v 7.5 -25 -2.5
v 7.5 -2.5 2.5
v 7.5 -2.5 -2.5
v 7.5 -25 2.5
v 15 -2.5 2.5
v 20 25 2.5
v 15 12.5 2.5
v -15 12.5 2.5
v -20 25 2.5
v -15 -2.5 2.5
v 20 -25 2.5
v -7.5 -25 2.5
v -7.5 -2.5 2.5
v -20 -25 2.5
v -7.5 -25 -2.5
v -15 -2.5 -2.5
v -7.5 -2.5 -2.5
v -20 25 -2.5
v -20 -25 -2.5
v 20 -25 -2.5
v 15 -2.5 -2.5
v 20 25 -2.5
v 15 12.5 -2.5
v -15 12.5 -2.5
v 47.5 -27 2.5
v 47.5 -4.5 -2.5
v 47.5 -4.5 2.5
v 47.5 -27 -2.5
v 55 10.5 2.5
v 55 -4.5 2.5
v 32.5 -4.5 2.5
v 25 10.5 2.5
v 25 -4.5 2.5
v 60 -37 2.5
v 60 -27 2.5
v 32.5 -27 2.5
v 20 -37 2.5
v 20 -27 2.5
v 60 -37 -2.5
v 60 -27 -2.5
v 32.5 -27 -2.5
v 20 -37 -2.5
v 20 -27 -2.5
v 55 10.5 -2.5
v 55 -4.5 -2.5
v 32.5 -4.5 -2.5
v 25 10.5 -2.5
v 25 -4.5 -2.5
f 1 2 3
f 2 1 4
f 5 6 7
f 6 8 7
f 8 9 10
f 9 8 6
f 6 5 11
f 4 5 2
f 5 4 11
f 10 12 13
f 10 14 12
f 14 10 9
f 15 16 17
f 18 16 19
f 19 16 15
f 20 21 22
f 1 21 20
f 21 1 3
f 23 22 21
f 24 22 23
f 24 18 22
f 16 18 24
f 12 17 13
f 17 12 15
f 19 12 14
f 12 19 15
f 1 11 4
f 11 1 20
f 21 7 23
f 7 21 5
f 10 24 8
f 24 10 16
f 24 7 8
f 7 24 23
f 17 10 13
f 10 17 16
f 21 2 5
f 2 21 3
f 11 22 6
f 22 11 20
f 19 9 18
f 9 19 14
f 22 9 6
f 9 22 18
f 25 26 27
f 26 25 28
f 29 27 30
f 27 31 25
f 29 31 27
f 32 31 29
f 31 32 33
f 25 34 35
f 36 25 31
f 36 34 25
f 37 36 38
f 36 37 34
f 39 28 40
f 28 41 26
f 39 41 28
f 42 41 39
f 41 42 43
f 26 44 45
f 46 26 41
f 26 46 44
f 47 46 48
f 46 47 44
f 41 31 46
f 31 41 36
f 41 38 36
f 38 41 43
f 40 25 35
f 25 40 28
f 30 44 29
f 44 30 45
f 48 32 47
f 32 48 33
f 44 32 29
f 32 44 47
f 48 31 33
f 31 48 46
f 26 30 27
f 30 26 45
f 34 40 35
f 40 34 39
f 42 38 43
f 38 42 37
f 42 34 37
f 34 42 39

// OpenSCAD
module tShape () {
  cube([15, 30, 5], true);
  translate([0, 15, 0]) cube([30, 15, 5], true);
}

// F
difference() {
  cube([40, 50, 5], true);
  translate([0, -10, 0]) tShape();
}

// M
translate([40, -32, 0]) {
  cube([40, 10, 5], true);
  translate([0, 20, 0]) tShape();
}
